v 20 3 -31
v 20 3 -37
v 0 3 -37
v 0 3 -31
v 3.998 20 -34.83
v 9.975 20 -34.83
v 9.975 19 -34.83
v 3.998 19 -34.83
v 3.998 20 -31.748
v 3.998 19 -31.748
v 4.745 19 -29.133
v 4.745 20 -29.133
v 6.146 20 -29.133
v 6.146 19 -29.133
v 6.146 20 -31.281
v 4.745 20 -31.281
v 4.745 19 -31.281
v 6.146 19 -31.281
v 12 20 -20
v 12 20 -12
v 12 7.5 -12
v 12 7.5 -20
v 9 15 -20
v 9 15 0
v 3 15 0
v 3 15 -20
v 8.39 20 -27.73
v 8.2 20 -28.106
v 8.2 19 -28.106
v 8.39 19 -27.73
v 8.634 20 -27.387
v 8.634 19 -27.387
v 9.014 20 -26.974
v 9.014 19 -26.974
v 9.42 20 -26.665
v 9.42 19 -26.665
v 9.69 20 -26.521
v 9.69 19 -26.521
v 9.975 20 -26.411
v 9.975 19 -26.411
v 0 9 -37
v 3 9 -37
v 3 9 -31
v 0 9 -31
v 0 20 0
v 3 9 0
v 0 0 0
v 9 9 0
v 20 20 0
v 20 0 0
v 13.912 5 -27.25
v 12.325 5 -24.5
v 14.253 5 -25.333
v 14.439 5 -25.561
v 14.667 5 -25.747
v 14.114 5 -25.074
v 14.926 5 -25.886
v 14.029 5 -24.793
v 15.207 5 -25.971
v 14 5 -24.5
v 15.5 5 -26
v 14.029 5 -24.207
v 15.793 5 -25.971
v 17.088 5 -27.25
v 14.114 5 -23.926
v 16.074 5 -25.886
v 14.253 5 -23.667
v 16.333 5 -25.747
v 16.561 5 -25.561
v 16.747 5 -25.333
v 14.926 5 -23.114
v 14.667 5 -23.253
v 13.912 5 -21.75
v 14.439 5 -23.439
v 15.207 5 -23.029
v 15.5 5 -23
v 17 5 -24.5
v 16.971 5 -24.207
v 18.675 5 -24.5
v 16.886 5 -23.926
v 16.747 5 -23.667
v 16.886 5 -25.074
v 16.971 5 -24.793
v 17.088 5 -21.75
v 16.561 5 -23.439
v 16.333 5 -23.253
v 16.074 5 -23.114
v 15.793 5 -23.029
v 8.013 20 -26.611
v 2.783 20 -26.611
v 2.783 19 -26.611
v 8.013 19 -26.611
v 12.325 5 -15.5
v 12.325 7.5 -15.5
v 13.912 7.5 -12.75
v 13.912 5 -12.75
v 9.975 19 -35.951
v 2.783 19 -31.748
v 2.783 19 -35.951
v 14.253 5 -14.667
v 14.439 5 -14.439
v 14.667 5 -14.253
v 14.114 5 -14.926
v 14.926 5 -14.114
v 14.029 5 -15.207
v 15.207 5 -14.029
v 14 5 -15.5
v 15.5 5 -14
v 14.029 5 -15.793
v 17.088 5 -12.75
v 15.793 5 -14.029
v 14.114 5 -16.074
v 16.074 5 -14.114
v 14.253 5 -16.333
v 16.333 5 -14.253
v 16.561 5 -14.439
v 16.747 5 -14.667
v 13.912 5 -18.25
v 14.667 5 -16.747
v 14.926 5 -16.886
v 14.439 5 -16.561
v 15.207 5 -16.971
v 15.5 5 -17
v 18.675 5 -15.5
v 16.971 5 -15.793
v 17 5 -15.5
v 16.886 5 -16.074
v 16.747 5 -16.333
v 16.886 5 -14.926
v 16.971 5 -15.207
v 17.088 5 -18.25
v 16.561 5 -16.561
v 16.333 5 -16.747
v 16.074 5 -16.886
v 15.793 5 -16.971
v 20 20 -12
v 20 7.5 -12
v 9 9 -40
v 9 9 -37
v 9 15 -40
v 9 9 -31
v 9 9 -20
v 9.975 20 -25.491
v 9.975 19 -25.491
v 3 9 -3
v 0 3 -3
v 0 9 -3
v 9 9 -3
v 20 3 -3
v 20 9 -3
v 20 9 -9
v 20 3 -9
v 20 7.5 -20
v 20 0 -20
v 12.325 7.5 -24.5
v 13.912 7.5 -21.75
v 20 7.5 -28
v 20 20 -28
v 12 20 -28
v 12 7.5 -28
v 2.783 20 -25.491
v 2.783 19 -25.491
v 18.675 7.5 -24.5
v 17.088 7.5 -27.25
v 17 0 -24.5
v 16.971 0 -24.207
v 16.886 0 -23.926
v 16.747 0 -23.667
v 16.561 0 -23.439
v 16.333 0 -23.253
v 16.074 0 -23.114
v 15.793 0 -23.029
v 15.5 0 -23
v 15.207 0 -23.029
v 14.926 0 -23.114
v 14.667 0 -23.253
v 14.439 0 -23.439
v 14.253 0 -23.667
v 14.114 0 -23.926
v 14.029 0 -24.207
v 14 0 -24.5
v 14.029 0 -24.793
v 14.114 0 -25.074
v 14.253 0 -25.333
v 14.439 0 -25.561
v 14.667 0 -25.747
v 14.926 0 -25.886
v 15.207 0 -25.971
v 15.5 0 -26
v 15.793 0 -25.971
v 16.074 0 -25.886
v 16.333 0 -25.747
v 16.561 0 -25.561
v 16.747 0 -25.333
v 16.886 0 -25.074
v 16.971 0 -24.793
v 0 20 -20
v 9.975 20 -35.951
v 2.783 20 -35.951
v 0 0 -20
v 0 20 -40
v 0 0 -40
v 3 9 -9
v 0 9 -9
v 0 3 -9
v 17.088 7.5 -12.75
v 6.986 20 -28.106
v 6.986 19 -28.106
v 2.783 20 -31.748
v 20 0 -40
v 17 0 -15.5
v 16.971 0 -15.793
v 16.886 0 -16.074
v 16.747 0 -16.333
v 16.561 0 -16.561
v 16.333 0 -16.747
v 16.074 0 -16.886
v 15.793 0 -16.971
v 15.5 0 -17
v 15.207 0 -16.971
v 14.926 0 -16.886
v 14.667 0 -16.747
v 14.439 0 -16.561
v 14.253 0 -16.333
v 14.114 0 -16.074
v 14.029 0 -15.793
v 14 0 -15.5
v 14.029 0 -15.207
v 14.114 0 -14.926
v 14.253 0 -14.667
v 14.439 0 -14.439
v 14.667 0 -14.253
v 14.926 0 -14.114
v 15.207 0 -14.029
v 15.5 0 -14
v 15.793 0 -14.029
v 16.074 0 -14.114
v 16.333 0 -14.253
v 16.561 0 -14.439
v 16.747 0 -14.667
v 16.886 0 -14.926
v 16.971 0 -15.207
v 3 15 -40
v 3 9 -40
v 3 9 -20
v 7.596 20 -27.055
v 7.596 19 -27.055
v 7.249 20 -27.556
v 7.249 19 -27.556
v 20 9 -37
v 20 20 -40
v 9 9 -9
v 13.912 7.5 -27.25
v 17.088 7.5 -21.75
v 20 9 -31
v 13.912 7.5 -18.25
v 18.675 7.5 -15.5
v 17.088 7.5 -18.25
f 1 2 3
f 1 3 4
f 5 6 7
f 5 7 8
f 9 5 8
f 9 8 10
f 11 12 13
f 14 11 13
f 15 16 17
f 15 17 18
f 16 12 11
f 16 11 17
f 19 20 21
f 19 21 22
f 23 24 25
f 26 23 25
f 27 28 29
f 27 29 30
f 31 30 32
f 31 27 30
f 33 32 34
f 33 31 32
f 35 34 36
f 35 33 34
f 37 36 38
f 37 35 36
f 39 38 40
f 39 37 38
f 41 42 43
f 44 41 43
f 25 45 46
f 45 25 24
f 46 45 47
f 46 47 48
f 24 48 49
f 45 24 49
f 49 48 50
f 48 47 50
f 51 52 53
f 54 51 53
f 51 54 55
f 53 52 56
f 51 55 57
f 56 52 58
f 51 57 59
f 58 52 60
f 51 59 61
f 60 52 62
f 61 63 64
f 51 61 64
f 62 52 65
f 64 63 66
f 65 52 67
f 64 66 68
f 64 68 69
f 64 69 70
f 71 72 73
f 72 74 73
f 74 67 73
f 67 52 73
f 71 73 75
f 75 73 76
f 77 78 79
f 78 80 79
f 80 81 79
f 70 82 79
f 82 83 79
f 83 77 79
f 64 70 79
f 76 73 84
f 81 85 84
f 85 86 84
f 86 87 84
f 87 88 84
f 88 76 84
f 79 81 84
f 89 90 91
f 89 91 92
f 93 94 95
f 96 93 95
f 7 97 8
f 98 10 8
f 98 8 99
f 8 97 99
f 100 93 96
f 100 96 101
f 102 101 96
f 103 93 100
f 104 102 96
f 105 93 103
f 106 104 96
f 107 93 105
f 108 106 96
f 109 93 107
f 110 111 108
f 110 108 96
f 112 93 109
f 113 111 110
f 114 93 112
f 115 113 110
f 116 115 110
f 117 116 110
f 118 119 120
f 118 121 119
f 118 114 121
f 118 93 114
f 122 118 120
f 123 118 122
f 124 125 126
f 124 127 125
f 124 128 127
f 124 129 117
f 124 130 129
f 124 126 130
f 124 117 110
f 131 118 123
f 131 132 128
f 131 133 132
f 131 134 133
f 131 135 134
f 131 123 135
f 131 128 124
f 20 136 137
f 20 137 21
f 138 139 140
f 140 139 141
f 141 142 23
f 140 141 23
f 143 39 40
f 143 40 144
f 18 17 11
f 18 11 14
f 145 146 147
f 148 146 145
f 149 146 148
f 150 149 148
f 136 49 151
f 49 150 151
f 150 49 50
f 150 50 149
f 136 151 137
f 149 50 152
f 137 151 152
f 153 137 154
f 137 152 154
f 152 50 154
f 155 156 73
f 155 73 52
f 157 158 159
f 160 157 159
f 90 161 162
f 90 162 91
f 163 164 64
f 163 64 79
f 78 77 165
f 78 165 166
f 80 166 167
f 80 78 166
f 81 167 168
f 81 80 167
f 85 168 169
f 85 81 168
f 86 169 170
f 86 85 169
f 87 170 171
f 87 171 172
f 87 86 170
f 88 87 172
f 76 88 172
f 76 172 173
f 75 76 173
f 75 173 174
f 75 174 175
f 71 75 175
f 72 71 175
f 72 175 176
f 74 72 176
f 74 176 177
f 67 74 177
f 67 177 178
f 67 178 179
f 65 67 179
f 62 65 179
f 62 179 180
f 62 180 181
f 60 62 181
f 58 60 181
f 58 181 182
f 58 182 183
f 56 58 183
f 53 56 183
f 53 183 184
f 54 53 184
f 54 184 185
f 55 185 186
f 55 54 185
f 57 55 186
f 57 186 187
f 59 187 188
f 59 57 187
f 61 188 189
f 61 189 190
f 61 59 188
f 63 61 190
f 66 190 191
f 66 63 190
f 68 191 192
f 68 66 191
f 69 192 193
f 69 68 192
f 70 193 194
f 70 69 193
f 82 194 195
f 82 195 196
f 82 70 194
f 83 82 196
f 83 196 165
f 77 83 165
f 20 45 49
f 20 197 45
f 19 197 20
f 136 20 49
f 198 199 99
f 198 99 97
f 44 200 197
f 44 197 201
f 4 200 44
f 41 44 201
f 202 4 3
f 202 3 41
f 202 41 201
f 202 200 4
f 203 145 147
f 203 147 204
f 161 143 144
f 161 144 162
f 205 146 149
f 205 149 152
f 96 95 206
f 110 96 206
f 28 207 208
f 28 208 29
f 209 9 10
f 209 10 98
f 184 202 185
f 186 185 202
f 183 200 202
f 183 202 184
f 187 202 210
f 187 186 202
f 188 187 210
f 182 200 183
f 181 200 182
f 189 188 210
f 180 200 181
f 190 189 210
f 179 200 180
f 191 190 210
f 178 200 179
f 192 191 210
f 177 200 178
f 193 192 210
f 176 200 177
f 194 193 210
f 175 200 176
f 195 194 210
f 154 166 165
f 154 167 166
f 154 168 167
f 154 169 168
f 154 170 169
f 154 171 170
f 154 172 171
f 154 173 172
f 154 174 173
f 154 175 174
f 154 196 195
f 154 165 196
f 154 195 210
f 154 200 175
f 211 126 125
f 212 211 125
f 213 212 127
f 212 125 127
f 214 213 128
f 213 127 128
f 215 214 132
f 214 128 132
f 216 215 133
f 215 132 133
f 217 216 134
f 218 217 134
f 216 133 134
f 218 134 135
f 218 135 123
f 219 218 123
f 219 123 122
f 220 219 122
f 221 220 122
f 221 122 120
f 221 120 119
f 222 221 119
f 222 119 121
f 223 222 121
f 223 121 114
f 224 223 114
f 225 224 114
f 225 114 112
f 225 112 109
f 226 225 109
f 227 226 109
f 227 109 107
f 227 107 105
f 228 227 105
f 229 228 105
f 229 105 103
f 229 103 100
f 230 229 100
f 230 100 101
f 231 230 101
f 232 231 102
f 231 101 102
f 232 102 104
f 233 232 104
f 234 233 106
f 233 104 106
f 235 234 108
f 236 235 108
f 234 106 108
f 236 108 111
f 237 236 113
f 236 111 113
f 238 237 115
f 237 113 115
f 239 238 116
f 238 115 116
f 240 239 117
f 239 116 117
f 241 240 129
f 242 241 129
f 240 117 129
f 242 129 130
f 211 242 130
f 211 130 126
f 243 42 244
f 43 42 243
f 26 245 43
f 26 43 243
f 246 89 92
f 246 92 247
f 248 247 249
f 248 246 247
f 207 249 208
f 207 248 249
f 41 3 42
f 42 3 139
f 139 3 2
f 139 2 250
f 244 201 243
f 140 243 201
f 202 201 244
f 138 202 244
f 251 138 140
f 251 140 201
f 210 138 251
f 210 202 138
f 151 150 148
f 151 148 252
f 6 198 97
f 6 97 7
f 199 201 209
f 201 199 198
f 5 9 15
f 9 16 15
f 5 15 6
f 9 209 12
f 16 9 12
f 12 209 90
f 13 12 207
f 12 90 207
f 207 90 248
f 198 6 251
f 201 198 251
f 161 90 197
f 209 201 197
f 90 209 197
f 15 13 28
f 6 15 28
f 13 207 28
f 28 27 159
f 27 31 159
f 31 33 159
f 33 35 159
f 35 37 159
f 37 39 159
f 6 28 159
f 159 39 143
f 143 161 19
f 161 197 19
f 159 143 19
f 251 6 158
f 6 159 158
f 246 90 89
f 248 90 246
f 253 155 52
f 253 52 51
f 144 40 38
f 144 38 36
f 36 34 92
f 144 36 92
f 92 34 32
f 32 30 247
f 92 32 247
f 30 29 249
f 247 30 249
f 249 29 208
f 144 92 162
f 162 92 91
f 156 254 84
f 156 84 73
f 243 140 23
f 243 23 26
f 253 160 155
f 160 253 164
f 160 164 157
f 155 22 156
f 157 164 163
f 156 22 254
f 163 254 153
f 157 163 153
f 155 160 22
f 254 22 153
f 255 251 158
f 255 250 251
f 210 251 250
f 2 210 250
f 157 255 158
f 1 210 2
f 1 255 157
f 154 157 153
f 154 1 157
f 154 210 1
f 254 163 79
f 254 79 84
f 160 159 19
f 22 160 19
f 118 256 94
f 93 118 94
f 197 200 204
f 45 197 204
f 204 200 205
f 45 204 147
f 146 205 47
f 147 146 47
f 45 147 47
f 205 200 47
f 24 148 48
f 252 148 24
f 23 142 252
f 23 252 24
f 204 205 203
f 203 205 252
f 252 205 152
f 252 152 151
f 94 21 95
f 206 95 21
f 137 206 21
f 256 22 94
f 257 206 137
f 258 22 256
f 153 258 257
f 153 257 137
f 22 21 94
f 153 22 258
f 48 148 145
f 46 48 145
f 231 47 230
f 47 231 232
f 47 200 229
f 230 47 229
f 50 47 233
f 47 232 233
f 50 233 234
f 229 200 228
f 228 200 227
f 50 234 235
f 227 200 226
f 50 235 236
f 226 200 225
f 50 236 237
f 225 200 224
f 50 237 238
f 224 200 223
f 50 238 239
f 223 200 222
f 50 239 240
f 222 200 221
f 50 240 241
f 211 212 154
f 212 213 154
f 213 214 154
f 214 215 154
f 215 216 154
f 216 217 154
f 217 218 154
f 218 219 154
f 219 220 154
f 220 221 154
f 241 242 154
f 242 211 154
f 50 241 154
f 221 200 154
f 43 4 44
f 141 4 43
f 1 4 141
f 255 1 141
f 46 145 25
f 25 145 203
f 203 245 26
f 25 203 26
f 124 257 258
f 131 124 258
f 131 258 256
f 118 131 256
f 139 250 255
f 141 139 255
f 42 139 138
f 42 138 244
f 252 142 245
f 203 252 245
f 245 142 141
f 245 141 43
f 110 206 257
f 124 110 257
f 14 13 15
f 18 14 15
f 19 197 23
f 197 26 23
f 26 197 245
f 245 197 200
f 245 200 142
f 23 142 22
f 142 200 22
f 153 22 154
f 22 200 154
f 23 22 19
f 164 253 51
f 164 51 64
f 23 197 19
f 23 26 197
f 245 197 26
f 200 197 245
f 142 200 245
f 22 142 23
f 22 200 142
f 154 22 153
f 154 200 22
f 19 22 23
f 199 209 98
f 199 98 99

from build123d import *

# Parameters (mm, degrees)
RESSALTO_EXTRUS_O1_DEPTH = 20
ESBO_O2_W                = 6
ESBO_O2_H                = 6
CORTE_EXTRUS_O1_DEPTH    = 20
ESBO_O3_W                = 6
ESBO_O3_H                = 6
CORTE_EXTRUS_O2_DEPTH    = 20
ESBO_O1_3_W              = 8
ESBO_O1_3_H              = 8
RESSALTO_EXTRUS_O2_DEPTH = 7.5
CORTE_EXTRUS_O3_DEPTH    = 2.5
ESBO_O4_3_R              = 1.5
CORTE_EXTRUS_O4_DEPTH    = 31.923292192
ESBO_O7_W                = 1.400901101
ESBO_O7_H                = 2.148048355
CORTE_EXTRUS_O5_DEPTH    = 1


with BuildPart() as part:
    # Esboço1 → Ressalto-extrusão1 (new body)
    with BuildSketch(Plane(origin=(0, 0, 0), x_dir=(1, 0, 0), z_dir=(0, 1, 0))):
        Polygon((12, 12), (12, 20), (0, 20), (0, 0), (20, 0), (20, 12), align=None)
    extrude(amount=RESSALTO_EXTRUS_O1_DEPTH)

    # Esboço2 → Corte-extrusão1 (cut)
    with BuildSketch(Plane(origin=(20, 0, 0), x_dir=(0, 0, -1), z_dir=(1, 0, 0))):
        with Locations((6, 6)):
            Rectangle(ESBO_O2_W, ESBO_O2_H)
    extrude(amount=-CORTE_EXTRUS_O1_DEPTH, mode=Mode.SUBTRACT)

    # Esboço3 → Corte-extrusão2 (cut)
    with BuildSketch(Plane(origin=(0, 0, -20), x_dir=(-1, 0, 0), z_dir=(0, 0, -1))):
        with Locations((-6, 12)):
            Rectangle(ESBO_O3_W, ESBO_O3_H)
    extrude(amount=-CORTE_EXTRUS_O2_DEPTH, mode=Mode.SUBTRACT)

    # Esboço1<3> → Ressalto-extrusão2 (add)
    with BuildSketch(Plane(origin=(0, 0, 0), x_dir=(1, 0, 0), z_dir=(0, 1, 0))):
        with Locations((16, 16)):
            Rectangle(ESBO_O1_3_W, ESBO_O1_3_H)
    extrude(amount=RESSALTO_EXTRUS_O2_DEPTH)

    # Esboço4 → Corte-extrusão3 (cut)
    with BuildSketch(Plane(origin=(0, 7.5, 0), x_dir=(1, 0, 0), z_dir=(0, 1, 0))):
        Polygon((13.91228676, 18.25), (12.324573519, 15.5), (13.91228676, 12.75), (17.08771324, 12.75), (18.675426481, 15.5), (17.08771324, 18.25), align=None)
    extrude(amount=-CORTE_EXTRUS_O3_DEPTH, mode=Mode.SUBTRACT)

    # Esboço4<3> → Corte-extrusão4 (cut, through all)
    with BuildSketch(Plane(origin=(0, 7.5, 0), x_dir=(1, 0, 0), z_dir=(0, 1, 0))):
        with Locations((15.5, 15.5)):
            Circle(ESBO_O4_3_R)
    extrude(amount=-CORTE_EXTRUS_O4_DEPTH, mode=Mode.SUBTRACT)


with BuildPart() as body_2:
    # Espelhar1: mirrored copy
    add(part.part.mirror(Plane(origin=(-12.141421356, 20, -20), x_dir=(1, 0, 0), z_dir=(0, 0, -1))))

    # Esboço7 → Corte-extrusão5 (cut)
    with BuildSketch(Plane(origin=(0, 20, 0), x_dir=(1, 0, 0), z_dir=(0, 1, 0))):
        Polygon((2.783424816, 35.950756168), (9.974717134, 35.950756168), (9.974717134, 34.830035287), (3.997539104, 34.830035287), (3.997539104, 31.748052865), (2.783424816, 31.748052865), align=None)
        with Locations((5.445136908, 30.207061655)):
            Rectangle(ESBO_O7_W, ESBO_O7_H)
        with BuildLine():
            Line((2.783424816, 25.490694615), (2.783424816, 26.611415495))
            Line((2.783424816, 26.611415495), (8.013455593, 26.611415495))
            add(Edge.make_bspline(
                [(8.013455593, 26.611415495), (7.956411457, 26.665764983), (7.843279583, 26.773552739), (7.685471783, 26.945128313), (7.539228038, 27.122576834), (7.406822909, 27.308171919), (7.281823141, 27.496696655), (7.170922859, 27.693520375), (7.07110991, 27.896079573), (7.014475836, 28.035782738), (6.986128119, 28.105710003)],
                knots=[0, 0, 0, 0, 1.033503725, 2.049679824, 3.056413032, 4.048331092, 5.039591953, 6.022745765, 7.010301735, 8, 8, 8, 8], degree=3))
            Line((6.986128119, 28.105710003), (8.200242406, 28.105710003))
            add(Edge.make_bspline(
                [(8.200242406, 28.105710003), (8.236066427, 28.025116526), (8.310650014, 27.857325464), (8.460324288, 27.611800786), (8.648310553, 27.363786483), (8.827695235, 27.157127828), (8.987454389, 26.996120291), (9.11521435, 26.883747501), (9.246337495, 26.779186126), (9.383497662, 26.686533309), (9.524626153, 26.602348603), (9.670003799, 26.528562753), (9.819683418, 26.462912887), (9.922856549, 26.428695038), (9.974717134, 26.411495234)],
                knots=[0, 0, 0, 0, 1.255971001, 2.614860626, 4.085896947, 5.687542932, 6.511057959, 7.316458574, 8.111137054, 8.899470754, 9.673439434, 10.45161887, 11.221697062, 12, 12, 12, 12], degree=3))
            Line((9.974717134, 26.411495234), (9.974717134, 25.490694615))
            Line((9.974717134, 25.490694615), (2.783424816, 25.490694615))
        make_face()
    extrude(amount=-CORTE_EXTRUS_O5_DEPTH, mode=Mode.SUBTRACT)


solid = Compound([part.part, body_2.part])
